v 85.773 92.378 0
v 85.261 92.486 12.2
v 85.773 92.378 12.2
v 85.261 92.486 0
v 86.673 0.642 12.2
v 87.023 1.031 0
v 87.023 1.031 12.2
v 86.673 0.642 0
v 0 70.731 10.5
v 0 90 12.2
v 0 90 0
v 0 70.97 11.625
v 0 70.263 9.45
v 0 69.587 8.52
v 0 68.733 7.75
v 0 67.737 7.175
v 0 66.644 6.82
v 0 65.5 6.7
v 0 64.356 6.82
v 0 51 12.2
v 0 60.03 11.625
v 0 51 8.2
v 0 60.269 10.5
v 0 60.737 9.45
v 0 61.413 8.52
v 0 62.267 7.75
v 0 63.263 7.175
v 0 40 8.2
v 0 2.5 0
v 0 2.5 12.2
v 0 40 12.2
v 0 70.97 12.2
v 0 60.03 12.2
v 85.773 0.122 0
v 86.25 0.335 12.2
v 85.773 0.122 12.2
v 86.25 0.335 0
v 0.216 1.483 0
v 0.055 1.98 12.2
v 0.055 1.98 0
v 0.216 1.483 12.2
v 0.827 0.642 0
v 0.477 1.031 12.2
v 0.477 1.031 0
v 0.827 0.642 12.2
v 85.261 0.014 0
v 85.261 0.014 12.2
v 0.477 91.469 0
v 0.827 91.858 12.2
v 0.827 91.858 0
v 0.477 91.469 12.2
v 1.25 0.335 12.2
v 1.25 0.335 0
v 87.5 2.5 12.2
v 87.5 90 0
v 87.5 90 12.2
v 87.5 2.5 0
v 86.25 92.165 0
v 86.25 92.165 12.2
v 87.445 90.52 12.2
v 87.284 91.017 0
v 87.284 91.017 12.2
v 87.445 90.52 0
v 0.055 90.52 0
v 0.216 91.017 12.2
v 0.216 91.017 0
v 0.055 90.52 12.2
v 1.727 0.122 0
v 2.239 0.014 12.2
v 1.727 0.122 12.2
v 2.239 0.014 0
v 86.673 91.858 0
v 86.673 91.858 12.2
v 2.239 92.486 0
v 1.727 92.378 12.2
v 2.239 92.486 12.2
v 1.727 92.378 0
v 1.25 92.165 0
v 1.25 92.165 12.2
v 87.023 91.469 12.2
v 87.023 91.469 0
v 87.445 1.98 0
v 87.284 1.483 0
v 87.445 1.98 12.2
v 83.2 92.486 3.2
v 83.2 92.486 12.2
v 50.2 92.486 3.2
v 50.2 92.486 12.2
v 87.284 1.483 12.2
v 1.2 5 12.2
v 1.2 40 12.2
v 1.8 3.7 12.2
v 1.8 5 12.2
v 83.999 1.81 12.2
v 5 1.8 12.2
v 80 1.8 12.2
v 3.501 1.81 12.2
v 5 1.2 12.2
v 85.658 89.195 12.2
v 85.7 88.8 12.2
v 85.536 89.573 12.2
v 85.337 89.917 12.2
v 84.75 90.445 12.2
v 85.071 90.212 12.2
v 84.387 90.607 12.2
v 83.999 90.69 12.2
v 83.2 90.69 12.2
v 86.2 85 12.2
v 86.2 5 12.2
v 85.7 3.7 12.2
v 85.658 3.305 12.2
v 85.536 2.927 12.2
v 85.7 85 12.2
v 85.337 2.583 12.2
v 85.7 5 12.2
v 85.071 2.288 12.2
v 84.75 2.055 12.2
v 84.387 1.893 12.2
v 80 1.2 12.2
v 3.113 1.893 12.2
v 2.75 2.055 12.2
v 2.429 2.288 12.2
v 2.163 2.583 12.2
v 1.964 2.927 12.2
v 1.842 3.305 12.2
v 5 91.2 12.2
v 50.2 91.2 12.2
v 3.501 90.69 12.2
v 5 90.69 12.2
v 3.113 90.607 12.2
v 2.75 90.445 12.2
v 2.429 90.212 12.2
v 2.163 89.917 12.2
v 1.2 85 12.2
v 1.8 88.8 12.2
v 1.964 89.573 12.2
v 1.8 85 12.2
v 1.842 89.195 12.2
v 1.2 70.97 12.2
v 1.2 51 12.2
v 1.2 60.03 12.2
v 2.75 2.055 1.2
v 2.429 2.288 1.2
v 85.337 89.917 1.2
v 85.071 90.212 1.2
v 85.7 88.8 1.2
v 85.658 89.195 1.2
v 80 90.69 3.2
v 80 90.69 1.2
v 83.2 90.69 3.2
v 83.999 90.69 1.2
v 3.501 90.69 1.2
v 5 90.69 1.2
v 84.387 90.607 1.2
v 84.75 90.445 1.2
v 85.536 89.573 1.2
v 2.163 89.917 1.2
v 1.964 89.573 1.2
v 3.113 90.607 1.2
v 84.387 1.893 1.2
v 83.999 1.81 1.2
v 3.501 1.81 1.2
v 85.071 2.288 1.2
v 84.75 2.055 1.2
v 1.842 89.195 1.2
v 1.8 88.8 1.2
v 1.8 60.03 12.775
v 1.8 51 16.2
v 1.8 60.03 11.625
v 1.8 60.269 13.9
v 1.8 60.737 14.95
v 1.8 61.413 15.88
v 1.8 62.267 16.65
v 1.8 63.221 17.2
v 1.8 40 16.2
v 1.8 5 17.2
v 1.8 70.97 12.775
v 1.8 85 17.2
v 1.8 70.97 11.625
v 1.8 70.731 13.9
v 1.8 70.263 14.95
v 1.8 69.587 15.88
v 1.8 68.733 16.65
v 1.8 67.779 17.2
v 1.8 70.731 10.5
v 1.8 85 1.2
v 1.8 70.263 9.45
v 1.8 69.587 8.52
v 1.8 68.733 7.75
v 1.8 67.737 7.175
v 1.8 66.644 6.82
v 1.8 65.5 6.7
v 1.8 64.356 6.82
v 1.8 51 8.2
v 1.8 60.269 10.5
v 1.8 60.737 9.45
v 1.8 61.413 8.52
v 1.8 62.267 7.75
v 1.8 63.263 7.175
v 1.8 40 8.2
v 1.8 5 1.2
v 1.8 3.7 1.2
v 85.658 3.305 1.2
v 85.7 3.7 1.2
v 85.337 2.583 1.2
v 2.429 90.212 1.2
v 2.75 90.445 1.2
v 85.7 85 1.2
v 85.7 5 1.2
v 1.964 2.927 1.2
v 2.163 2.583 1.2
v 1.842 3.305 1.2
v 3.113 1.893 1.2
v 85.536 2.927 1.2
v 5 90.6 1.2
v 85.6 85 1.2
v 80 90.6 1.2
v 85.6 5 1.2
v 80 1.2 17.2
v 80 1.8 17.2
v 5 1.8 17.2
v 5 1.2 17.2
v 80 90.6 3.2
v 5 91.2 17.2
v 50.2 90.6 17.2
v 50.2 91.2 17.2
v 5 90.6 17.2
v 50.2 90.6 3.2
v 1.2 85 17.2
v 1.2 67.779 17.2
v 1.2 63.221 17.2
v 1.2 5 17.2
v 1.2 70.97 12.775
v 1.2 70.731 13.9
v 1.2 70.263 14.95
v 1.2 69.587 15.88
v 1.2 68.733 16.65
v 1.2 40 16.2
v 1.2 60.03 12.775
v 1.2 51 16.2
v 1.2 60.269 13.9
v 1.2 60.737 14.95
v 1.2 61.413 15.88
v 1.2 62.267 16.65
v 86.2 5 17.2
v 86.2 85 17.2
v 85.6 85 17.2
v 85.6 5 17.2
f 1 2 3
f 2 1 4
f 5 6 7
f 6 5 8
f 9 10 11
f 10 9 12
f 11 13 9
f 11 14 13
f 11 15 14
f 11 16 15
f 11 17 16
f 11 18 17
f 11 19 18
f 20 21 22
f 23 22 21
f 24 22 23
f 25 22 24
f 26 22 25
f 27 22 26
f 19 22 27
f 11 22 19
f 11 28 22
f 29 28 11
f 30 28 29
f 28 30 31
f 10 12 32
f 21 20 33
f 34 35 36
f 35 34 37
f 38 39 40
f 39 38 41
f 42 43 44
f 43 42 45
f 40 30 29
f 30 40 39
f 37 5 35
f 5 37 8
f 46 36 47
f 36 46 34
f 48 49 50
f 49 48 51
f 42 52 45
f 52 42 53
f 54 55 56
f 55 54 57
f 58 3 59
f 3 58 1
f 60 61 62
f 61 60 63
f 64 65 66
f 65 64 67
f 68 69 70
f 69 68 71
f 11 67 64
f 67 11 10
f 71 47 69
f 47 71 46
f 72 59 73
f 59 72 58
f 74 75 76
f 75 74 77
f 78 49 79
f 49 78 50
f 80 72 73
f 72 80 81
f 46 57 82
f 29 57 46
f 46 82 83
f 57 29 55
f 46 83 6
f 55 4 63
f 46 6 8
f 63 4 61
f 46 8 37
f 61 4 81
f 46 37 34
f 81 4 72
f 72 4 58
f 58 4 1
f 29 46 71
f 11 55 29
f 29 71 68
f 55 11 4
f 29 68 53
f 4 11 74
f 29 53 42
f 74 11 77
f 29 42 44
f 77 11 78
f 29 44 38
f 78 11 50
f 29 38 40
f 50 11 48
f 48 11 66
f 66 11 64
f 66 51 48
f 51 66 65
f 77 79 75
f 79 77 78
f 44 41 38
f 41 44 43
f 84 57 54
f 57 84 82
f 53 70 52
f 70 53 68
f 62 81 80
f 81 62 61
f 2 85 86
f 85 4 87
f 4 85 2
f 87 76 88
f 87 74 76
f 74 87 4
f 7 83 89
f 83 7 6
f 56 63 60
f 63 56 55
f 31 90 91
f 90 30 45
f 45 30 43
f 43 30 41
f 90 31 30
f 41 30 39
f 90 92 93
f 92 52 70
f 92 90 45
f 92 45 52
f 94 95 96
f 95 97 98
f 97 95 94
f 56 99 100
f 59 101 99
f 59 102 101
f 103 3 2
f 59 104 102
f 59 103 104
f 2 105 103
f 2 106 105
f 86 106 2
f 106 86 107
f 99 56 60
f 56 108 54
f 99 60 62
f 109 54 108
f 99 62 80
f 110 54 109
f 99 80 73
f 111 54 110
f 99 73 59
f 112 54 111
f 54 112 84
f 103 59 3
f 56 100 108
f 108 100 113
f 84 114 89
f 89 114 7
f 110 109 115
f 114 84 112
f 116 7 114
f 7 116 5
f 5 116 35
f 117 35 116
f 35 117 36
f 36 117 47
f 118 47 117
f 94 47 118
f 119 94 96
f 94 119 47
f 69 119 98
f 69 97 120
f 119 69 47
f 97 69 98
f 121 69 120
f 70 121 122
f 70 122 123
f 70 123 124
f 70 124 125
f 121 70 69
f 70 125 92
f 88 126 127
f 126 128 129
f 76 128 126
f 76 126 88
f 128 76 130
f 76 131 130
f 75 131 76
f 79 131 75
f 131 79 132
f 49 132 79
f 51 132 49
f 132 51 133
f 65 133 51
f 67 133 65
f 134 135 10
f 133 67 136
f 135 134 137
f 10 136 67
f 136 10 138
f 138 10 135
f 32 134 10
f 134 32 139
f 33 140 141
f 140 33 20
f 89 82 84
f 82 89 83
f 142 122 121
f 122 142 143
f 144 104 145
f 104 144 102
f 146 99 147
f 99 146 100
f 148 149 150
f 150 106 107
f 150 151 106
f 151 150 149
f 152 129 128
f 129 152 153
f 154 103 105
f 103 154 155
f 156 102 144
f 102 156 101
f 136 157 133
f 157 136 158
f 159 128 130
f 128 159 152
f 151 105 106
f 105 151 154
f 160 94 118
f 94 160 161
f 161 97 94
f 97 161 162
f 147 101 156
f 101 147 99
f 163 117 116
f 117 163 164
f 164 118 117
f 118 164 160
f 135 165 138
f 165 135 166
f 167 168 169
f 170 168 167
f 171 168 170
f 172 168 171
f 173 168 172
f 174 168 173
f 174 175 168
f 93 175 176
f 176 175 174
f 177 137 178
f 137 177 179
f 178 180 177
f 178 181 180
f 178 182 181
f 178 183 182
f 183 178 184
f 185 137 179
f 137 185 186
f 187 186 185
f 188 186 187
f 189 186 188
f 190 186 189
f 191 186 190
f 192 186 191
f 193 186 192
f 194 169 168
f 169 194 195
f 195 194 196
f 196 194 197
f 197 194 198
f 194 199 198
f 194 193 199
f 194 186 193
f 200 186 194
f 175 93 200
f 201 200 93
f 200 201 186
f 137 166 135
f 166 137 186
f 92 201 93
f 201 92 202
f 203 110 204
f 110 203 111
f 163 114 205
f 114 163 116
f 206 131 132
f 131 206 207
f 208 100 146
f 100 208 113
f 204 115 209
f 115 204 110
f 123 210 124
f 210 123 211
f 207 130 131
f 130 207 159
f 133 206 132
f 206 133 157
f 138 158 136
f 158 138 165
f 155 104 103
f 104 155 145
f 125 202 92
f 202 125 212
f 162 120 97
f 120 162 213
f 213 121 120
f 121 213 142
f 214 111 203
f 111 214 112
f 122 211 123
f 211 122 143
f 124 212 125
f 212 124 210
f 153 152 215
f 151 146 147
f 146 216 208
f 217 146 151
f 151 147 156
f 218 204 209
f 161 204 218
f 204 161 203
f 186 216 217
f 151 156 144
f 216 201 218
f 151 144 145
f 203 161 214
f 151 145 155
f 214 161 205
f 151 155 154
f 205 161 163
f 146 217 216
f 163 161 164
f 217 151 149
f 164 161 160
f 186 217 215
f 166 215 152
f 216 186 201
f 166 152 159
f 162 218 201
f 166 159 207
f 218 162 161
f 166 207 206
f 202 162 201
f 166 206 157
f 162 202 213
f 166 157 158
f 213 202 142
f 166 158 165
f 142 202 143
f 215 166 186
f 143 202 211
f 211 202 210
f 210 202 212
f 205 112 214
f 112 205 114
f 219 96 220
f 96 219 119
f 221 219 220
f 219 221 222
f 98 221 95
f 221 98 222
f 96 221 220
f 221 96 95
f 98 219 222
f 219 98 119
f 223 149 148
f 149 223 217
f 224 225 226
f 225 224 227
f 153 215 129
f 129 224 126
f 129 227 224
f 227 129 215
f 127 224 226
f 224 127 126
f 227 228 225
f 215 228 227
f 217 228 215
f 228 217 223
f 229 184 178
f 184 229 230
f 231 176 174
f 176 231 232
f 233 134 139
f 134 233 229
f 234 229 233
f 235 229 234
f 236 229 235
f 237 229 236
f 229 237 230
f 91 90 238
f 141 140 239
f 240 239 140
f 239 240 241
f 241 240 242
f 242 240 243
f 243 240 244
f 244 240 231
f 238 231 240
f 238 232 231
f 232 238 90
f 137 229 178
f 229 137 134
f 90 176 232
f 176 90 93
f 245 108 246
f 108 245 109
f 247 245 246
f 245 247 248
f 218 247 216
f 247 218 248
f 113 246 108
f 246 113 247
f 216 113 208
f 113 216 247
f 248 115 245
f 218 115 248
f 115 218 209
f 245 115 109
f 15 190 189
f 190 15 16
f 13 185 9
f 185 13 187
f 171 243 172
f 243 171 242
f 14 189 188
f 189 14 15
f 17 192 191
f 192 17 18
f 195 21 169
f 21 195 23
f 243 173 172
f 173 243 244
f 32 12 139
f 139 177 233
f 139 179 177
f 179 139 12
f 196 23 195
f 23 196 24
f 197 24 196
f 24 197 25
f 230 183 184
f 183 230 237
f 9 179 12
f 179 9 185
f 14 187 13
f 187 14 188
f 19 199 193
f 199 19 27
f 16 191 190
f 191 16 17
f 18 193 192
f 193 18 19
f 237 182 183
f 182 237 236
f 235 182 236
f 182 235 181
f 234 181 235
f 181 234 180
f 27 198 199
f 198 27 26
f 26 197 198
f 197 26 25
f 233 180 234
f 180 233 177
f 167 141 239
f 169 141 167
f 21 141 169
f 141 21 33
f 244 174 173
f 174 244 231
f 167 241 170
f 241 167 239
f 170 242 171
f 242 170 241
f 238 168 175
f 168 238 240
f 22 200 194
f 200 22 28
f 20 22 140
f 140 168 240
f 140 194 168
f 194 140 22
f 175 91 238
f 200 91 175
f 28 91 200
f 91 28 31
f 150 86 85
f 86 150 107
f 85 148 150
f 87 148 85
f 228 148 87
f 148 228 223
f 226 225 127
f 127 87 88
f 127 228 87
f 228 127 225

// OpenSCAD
// file: parameters.scad
// Speaker enclosure parameters

// Spacing between hexagon shapes in degrees.
spacing = 0.3;

// Absolute amount of spacing between hexagons in mm.
spacingAbs = 1; // mm

// Length of short side of streched hexagon shapes in degrees.
shortSide = 1;

// Distance of streched hexagon side points in degrees
armsDistance = 0.575;

// Hexagon shape height in mm
hexLength = 26.666667;

// Height and length of an enclosure wall.
wallLength = 160;

// In between the hexagon shapes transparent and non-transparent layers alternate.
// Thickness of non-transparent material in between hexagon shapes in mm
solidThickness = 0.6;

// Thickness of transparent material in between hexagon shapes in mm
betweenThickness = 1.2;

// Thickness of hexagon shapes in mm
hexThickness = 7.2;


// Front wall speaker mounting screw holes
// screw hole diameter in mm
screwDiameter = 3.85;

// distance of screw hole from wall center point in mm
screwCenterDistance = 41.5;

// Front wall specific parameters
// Side length of rectangle used to create an indentation [mm].
frontRectLength = 95;

// Diameter of circle for front indentation [mm]
frontCircleDiameter = 103;

// Diameter of the speaker cone hole [mm].
speakerConeDiameter = 93;

// Side walls
// amount of overlapping on edges [mm]
sideEdgeFixWidth = 15;


// Back wall
// Diameter of the banana adapter [mm]
bananaAdapterDiameter = 5;

// Measures of the LED light adapter [mm]
ledAdapterHeight = 7.5;
ledAdapterWidth = 11;

// Distance from adapters to bottom edge [mm]
adapterEdgeDistance = 25;

// Distance between adapters [mm]
adapterDistance = 15;

// Speaker stand
// front width of stand
standWidth = wallLength * 0.9;

// length of speaker stand
standLength = wallLength * 0.9;

// size of the back piece that prevents the speaker from sliding of the stand [mm]
standRimWidth = 5;
standRimHeight = 8;

// max height of the stand [mm]
standHeight = 15;

// Front cover
// front cover thickness [mm]
coverThickness = 5;


/// LED Guide
// Distance from enclosure wall = spacing of strip to wall [mm]
guide_distance = 22.5;

// Thickness of the LED guide [mm]
guide_thickness = 1.5;

// Width of the LED guide [mm]
guide_width = 8;

// Length of one guide segment [mm]
guide_segment_length = 13;

// Length of the guide feet that get attached to the enclosure wall [mm]
guide_foot_length = 5;

// Number of total segments per LED guide
total_segments = 8;

// Width of the LED strip [mm]
led_strip_width = 10;

/// Back-side connectors
connector_length = 8;
connector_outer = 9;
connector_inner = 6;


/// Case
// wall thickness of the case [mm]
case_thickness = 1.2;

// inner case shell measurements [mm]
case_height = 22;
case_width = 85;
case_length = 90;

// diameter of the power connector hole [mm]
power_connector_diameter = 11;
power_connector_dist = 30;

// USB hole measurements [mm]
usb_width = 33;
usb_height = 18;
usb_dist = 3;

// LED connector measurements [mm]
led_connector_height = 8;
led_connector_width = 11;
led_connector_dist = 50;

// rounded case corners
case_bevel_diameter = 5;

case_connector_length = 5;
// main file
// Case for Raspberry Pi

include <parameters.scad>;

$fn = 30;


module case_outer_shell() {
    difference() {
        hull() {
            translate([case_bevel_diameter / 2, case_bevel_diameter / 2]) {
                cylinder(case_height / 2 + case_thickness, case_bevel_diameter / 2, case_bevel_diameter / 2);
            }
            
            translate([case_width, case_bevel_diameter / 2]) {
                cylinder(case_height / 2 + case_thickness, case_bevel_diameter / 2, case_bevel_diameter / 2);
            }
            
            translate([case_bevel_diameter / 2, case_length]) {
                cylinder(case_height / 2 + case_thickness, case_bevel_diameter / 2, case_bevel_diameter / 2);
            }
            
            translate([case_width, case_length]) {
                cylinder(case_height / 2 + case_thickness, case_bevel_diameter / 2, case_bevel_diameter / 2);
            }
        }
        
        hull() {
            translate([case_bevel_diameter / 2 + case_thickness, case_bevel_diameter / 2 + case_thickness, case_thickness]) {
                cylinder(case_height / 2 + case_thickness, case_bevel_diameter / 2 - case_thickness / 2, case_bevel_diameter / 2 - case_thickness / 2);
            }
            
            translate([case_width - case_thickness, case_bevel_diameter / 2 + case_thickness, case_thickness]) {
                cylinder(case_height / 2 + case_thickness, case_bevel_diameter / 2 - case_thickness / 2, case_bevel_diameter / 2 - case_thickness / 2);
            }
            
            translate([case_bevel_diameter / 2 + case_thickness, case_length - case_thickness, case_thickness]) {
                cylinder(case_height / 2 + case_thickness, case_bevel_diameter / 2 - case_thickness / 2, case_bevel_diameter / 2 - case_thickness / 2);
            }
            
            translate([case_width - case_thickness, case_length - case_thickness, case_thickness]) {
                cylinder(case_height / 2 + case_thickness, case_bevel_diameter / 2 - case_thickness / 2, case_bevel_diameter / 2 - case_thickness / 2);
            }
        }
    }
}

module case_connectors() {
    translate([case_bevel_diameter, case_thickness, 0]) {
            cube([case_width - 2 * case_bevel_diameter, case_thickness / 2, case_height / 2 + case_thickness + case_connector_length]);
        }
        
        translate([case_bevel_diameter, case_thickness / 2 + case_length, 0]) {
            cube([case_width - 2 * case_bevel_diameter, case_thickness / 2, case_height / 2 + case_thickness + case_connector_length]);
        }
        
        translate([case_thickness, case_bevel_diameter, 0]) {
            cube([case_thickness / 2, case_length - 2 * case_bevel_diameter, case_height / 2 + case_thickness + case_connector_length]);
        }
        
        translate([case_thickness / 2 + case_width, case_bevel_diameter, 0]) {
            cube([case_thickness / 2, case_length - 2 * case_bevel_diameter, case_height / 2 + case_thickness + case_connector_length]);    
        }
}

module case_half(is_top) {
    if (is_top) {
        case_outer_shell();
        case_connectors();
    } else {
        difference() {
            translate([0, 0, case_height + case_thickness]) {
                mirror([0, 0, 1]) {
                    case_outer_shell();
                }
            }
            case_connectors();
        }
    }
}

module case_shell(is_top) {
    difference() {
        case_half(is_top);
        
        // power connector hole
    
        translate([-case_thickness, case_length - power_connector_dist + power_connector_diameter / 2, case_height / 2 + case_thickness]) {
            rotate([0, 90, 0]) {
                cylinder(case_thickness * 3, power_connector_diameter / 2, power_connector_diameter / 2);
            }
        }
        
        // LED connector
        translate([-case_thickness, case_length - led_connector_dist, case_height / 2 + case_thickness - led_connector_height / 2]) {
            cube([case_thickness * 3, led_connector_width, led_connector_height]);
        }
        
        // USB
        translate([case_width - usb_width - usb_dist + case_thickness, case_length, case_height / 2 + case_thickness - usb_height / 2]) {
            cube([usb_width, case_thickness * 3, usb_height]);
        }
    }
}

module case_top() {
    case_shell(true);
}

module case_bottom() {
    case_shell(false);
}


case_top();
//case_bottom();
